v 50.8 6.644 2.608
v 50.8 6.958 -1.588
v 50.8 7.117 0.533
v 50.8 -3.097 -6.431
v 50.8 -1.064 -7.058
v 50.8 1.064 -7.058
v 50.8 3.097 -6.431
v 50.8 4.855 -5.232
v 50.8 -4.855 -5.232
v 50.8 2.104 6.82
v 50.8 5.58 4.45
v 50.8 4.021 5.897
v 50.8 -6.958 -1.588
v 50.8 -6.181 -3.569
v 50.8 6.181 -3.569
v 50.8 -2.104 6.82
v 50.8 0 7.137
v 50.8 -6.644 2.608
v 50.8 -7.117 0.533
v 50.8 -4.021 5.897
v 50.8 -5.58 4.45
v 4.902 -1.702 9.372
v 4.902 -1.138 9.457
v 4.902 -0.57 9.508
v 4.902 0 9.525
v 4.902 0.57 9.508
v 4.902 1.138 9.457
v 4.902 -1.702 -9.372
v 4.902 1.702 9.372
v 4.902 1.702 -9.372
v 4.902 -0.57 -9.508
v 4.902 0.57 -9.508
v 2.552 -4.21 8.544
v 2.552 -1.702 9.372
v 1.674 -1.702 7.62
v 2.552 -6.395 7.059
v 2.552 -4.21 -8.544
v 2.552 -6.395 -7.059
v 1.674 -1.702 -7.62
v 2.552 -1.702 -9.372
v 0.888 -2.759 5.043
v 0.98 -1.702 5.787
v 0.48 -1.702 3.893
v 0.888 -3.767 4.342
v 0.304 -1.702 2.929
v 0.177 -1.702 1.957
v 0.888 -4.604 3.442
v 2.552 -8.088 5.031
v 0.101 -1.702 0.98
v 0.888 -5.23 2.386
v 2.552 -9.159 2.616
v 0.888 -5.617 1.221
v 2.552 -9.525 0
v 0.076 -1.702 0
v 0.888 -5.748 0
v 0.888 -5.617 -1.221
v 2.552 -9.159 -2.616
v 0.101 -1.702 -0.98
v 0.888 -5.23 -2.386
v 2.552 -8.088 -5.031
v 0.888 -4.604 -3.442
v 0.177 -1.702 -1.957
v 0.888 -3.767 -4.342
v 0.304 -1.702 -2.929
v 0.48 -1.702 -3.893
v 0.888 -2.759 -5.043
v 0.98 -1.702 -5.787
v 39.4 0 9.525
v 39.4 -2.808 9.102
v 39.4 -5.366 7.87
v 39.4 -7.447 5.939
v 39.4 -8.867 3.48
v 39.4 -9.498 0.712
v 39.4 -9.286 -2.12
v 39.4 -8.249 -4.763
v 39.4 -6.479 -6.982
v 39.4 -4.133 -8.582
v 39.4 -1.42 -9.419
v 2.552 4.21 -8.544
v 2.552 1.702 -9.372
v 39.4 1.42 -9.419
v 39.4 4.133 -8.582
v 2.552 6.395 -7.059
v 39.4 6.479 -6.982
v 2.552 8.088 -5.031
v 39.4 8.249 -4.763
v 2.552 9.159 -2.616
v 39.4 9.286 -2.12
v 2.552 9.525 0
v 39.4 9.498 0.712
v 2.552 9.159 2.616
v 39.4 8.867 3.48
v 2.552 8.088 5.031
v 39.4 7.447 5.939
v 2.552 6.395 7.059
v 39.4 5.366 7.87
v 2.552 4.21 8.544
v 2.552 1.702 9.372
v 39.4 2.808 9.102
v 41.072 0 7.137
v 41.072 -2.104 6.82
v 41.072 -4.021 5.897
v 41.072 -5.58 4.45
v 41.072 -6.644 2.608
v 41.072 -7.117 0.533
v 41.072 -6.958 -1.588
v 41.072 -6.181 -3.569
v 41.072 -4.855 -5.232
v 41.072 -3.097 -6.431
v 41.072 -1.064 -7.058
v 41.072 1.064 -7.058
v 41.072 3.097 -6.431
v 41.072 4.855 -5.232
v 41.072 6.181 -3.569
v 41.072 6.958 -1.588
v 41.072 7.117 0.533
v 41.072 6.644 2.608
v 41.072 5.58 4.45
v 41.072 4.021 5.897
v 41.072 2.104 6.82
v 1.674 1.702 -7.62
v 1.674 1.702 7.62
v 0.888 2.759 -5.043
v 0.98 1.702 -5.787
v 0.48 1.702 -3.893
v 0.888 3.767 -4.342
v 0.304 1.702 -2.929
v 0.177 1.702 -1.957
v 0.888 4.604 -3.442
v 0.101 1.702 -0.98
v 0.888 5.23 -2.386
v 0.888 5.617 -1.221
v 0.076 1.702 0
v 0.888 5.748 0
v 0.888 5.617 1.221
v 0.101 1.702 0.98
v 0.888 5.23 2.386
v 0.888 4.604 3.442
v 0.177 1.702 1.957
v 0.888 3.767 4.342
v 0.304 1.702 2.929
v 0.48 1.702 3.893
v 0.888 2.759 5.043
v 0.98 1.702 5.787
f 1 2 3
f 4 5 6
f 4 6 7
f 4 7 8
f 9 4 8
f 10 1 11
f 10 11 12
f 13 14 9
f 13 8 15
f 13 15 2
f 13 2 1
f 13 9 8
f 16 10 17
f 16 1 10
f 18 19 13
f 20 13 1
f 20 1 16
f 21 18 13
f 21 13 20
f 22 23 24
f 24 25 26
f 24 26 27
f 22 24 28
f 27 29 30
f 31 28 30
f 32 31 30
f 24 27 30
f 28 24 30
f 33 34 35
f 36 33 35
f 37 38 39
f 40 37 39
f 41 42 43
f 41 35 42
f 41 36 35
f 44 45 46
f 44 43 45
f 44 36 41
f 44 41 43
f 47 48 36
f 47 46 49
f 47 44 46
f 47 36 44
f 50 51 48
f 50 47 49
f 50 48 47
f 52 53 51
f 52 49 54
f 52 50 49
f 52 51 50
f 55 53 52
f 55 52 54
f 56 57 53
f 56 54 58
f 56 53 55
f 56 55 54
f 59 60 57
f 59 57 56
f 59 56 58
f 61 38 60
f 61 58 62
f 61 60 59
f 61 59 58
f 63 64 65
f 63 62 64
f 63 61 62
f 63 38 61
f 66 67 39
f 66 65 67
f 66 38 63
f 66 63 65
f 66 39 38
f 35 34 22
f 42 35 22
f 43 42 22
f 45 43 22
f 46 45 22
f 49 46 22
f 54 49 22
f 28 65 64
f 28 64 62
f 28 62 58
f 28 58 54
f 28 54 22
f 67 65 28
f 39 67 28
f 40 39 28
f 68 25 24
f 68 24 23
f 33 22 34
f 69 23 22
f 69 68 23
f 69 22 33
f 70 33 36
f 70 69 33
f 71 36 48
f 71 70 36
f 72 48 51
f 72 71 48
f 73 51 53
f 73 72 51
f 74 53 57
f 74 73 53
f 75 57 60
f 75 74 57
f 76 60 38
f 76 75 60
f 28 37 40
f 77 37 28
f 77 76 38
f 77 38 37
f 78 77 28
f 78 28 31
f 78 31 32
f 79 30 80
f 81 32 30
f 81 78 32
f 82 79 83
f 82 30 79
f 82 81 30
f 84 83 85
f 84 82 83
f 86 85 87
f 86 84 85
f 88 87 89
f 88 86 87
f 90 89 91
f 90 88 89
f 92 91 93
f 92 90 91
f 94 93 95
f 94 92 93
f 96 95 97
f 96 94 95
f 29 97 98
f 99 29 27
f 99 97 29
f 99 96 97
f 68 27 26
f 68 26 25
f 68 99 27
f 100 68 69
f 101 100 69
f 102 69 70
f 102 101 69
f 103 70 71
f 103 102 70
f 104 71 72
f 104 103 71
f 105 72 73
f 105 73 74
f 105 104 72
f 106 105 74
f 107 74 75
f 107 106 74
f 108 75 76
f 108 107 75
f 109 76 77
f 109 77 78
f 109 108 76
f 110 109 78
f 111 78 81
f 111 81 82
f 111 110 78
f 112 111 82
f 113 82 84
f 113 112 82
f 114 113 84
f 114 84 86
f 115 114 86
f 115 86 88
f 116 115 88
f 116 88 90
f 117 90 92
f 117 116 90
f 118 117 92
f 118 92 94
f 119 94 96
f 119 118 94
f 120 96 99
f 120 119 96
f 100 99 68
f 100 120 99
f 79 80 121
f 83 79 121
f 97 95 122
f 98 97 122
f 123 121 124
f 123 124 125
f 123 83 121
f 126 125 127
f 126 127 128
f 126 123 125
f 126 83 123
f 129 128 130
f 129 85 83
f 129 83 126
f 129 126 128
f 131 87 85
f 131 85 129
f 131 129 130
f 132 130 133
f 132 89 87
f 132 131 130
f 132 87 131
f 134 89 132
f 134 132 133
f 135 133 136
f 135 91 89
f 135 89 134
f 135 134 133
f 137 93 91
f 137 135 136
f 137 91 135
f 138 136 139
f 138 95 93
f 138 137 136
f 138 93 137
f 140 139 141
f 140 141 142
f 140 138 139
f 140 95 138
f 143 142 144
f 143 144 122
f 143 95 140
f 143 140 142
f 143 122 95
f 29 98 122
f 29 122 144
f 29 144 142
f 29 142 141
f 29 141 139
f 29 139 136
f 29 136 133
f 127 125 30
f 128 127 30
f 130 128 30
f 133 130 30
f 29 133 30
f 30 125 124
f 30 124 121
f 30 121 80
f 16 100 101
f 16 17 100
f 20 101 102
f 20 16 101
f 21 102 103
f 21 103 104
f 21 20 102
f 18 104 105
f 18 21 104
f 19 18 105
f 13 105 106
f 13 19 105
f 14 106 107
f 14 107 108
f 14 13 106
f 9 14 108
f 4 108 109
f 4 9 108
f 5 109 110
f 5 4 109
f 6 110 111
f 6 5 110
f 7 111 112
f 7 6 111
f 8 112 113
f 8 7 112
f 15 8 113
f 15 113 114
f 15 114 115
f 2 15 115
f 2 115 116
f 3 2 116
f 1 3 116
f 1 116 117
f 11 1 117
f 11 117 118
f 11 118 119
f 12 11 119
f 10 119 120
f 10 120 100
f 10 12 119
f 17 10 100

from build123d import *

# Parameters (mm, degrees)
SKETCH2_W  = 19.05
SKETCH2_H  = 3.4036
SLOT_DEPTH = 4.9022


with BuildPart() as part:
    # BodySke → BaseBody (revolve)
    with BuildSketch(Plane.XY, mode=Mode.PRIVATE) as basebody_sk:
        with BuildLine():
            Line((41.0718, 7.1374), (50.8, 7.1374))
            Line((50.8, 7.1374), (50.8, 0))
            Line((50.8, 0), (0, 0))
            ThreePointArc((0, 0), (0.649113009, 4.930502809), (2.552216058, 9.525))
            Line((2.552216058, 9.525), (39.399984482, 9.525))
            Line((39.399984482, 9.525), (41.0718, 7.1374))
        make_face()
    revolve(basebody_sk.sketch.rotate(Axis((-12.7, 0, 0), (1, 0, 0)), 90), axis=Axis((-12.7, 0, 0), (1, 0, 0)))

    # Sketch2 → Slot (cut)
    with BuildSketch(Plane(origin=(0, 0, 0), x_dir=(0, 0, -1), z_dir=(1, 0, 0))):
        Rectangle(SKETCH2_W, SKETCH2_H)
    extrude(amount=SLOT_DEPTH, mode=Mode.SUBTRACT)


solid = part.part
